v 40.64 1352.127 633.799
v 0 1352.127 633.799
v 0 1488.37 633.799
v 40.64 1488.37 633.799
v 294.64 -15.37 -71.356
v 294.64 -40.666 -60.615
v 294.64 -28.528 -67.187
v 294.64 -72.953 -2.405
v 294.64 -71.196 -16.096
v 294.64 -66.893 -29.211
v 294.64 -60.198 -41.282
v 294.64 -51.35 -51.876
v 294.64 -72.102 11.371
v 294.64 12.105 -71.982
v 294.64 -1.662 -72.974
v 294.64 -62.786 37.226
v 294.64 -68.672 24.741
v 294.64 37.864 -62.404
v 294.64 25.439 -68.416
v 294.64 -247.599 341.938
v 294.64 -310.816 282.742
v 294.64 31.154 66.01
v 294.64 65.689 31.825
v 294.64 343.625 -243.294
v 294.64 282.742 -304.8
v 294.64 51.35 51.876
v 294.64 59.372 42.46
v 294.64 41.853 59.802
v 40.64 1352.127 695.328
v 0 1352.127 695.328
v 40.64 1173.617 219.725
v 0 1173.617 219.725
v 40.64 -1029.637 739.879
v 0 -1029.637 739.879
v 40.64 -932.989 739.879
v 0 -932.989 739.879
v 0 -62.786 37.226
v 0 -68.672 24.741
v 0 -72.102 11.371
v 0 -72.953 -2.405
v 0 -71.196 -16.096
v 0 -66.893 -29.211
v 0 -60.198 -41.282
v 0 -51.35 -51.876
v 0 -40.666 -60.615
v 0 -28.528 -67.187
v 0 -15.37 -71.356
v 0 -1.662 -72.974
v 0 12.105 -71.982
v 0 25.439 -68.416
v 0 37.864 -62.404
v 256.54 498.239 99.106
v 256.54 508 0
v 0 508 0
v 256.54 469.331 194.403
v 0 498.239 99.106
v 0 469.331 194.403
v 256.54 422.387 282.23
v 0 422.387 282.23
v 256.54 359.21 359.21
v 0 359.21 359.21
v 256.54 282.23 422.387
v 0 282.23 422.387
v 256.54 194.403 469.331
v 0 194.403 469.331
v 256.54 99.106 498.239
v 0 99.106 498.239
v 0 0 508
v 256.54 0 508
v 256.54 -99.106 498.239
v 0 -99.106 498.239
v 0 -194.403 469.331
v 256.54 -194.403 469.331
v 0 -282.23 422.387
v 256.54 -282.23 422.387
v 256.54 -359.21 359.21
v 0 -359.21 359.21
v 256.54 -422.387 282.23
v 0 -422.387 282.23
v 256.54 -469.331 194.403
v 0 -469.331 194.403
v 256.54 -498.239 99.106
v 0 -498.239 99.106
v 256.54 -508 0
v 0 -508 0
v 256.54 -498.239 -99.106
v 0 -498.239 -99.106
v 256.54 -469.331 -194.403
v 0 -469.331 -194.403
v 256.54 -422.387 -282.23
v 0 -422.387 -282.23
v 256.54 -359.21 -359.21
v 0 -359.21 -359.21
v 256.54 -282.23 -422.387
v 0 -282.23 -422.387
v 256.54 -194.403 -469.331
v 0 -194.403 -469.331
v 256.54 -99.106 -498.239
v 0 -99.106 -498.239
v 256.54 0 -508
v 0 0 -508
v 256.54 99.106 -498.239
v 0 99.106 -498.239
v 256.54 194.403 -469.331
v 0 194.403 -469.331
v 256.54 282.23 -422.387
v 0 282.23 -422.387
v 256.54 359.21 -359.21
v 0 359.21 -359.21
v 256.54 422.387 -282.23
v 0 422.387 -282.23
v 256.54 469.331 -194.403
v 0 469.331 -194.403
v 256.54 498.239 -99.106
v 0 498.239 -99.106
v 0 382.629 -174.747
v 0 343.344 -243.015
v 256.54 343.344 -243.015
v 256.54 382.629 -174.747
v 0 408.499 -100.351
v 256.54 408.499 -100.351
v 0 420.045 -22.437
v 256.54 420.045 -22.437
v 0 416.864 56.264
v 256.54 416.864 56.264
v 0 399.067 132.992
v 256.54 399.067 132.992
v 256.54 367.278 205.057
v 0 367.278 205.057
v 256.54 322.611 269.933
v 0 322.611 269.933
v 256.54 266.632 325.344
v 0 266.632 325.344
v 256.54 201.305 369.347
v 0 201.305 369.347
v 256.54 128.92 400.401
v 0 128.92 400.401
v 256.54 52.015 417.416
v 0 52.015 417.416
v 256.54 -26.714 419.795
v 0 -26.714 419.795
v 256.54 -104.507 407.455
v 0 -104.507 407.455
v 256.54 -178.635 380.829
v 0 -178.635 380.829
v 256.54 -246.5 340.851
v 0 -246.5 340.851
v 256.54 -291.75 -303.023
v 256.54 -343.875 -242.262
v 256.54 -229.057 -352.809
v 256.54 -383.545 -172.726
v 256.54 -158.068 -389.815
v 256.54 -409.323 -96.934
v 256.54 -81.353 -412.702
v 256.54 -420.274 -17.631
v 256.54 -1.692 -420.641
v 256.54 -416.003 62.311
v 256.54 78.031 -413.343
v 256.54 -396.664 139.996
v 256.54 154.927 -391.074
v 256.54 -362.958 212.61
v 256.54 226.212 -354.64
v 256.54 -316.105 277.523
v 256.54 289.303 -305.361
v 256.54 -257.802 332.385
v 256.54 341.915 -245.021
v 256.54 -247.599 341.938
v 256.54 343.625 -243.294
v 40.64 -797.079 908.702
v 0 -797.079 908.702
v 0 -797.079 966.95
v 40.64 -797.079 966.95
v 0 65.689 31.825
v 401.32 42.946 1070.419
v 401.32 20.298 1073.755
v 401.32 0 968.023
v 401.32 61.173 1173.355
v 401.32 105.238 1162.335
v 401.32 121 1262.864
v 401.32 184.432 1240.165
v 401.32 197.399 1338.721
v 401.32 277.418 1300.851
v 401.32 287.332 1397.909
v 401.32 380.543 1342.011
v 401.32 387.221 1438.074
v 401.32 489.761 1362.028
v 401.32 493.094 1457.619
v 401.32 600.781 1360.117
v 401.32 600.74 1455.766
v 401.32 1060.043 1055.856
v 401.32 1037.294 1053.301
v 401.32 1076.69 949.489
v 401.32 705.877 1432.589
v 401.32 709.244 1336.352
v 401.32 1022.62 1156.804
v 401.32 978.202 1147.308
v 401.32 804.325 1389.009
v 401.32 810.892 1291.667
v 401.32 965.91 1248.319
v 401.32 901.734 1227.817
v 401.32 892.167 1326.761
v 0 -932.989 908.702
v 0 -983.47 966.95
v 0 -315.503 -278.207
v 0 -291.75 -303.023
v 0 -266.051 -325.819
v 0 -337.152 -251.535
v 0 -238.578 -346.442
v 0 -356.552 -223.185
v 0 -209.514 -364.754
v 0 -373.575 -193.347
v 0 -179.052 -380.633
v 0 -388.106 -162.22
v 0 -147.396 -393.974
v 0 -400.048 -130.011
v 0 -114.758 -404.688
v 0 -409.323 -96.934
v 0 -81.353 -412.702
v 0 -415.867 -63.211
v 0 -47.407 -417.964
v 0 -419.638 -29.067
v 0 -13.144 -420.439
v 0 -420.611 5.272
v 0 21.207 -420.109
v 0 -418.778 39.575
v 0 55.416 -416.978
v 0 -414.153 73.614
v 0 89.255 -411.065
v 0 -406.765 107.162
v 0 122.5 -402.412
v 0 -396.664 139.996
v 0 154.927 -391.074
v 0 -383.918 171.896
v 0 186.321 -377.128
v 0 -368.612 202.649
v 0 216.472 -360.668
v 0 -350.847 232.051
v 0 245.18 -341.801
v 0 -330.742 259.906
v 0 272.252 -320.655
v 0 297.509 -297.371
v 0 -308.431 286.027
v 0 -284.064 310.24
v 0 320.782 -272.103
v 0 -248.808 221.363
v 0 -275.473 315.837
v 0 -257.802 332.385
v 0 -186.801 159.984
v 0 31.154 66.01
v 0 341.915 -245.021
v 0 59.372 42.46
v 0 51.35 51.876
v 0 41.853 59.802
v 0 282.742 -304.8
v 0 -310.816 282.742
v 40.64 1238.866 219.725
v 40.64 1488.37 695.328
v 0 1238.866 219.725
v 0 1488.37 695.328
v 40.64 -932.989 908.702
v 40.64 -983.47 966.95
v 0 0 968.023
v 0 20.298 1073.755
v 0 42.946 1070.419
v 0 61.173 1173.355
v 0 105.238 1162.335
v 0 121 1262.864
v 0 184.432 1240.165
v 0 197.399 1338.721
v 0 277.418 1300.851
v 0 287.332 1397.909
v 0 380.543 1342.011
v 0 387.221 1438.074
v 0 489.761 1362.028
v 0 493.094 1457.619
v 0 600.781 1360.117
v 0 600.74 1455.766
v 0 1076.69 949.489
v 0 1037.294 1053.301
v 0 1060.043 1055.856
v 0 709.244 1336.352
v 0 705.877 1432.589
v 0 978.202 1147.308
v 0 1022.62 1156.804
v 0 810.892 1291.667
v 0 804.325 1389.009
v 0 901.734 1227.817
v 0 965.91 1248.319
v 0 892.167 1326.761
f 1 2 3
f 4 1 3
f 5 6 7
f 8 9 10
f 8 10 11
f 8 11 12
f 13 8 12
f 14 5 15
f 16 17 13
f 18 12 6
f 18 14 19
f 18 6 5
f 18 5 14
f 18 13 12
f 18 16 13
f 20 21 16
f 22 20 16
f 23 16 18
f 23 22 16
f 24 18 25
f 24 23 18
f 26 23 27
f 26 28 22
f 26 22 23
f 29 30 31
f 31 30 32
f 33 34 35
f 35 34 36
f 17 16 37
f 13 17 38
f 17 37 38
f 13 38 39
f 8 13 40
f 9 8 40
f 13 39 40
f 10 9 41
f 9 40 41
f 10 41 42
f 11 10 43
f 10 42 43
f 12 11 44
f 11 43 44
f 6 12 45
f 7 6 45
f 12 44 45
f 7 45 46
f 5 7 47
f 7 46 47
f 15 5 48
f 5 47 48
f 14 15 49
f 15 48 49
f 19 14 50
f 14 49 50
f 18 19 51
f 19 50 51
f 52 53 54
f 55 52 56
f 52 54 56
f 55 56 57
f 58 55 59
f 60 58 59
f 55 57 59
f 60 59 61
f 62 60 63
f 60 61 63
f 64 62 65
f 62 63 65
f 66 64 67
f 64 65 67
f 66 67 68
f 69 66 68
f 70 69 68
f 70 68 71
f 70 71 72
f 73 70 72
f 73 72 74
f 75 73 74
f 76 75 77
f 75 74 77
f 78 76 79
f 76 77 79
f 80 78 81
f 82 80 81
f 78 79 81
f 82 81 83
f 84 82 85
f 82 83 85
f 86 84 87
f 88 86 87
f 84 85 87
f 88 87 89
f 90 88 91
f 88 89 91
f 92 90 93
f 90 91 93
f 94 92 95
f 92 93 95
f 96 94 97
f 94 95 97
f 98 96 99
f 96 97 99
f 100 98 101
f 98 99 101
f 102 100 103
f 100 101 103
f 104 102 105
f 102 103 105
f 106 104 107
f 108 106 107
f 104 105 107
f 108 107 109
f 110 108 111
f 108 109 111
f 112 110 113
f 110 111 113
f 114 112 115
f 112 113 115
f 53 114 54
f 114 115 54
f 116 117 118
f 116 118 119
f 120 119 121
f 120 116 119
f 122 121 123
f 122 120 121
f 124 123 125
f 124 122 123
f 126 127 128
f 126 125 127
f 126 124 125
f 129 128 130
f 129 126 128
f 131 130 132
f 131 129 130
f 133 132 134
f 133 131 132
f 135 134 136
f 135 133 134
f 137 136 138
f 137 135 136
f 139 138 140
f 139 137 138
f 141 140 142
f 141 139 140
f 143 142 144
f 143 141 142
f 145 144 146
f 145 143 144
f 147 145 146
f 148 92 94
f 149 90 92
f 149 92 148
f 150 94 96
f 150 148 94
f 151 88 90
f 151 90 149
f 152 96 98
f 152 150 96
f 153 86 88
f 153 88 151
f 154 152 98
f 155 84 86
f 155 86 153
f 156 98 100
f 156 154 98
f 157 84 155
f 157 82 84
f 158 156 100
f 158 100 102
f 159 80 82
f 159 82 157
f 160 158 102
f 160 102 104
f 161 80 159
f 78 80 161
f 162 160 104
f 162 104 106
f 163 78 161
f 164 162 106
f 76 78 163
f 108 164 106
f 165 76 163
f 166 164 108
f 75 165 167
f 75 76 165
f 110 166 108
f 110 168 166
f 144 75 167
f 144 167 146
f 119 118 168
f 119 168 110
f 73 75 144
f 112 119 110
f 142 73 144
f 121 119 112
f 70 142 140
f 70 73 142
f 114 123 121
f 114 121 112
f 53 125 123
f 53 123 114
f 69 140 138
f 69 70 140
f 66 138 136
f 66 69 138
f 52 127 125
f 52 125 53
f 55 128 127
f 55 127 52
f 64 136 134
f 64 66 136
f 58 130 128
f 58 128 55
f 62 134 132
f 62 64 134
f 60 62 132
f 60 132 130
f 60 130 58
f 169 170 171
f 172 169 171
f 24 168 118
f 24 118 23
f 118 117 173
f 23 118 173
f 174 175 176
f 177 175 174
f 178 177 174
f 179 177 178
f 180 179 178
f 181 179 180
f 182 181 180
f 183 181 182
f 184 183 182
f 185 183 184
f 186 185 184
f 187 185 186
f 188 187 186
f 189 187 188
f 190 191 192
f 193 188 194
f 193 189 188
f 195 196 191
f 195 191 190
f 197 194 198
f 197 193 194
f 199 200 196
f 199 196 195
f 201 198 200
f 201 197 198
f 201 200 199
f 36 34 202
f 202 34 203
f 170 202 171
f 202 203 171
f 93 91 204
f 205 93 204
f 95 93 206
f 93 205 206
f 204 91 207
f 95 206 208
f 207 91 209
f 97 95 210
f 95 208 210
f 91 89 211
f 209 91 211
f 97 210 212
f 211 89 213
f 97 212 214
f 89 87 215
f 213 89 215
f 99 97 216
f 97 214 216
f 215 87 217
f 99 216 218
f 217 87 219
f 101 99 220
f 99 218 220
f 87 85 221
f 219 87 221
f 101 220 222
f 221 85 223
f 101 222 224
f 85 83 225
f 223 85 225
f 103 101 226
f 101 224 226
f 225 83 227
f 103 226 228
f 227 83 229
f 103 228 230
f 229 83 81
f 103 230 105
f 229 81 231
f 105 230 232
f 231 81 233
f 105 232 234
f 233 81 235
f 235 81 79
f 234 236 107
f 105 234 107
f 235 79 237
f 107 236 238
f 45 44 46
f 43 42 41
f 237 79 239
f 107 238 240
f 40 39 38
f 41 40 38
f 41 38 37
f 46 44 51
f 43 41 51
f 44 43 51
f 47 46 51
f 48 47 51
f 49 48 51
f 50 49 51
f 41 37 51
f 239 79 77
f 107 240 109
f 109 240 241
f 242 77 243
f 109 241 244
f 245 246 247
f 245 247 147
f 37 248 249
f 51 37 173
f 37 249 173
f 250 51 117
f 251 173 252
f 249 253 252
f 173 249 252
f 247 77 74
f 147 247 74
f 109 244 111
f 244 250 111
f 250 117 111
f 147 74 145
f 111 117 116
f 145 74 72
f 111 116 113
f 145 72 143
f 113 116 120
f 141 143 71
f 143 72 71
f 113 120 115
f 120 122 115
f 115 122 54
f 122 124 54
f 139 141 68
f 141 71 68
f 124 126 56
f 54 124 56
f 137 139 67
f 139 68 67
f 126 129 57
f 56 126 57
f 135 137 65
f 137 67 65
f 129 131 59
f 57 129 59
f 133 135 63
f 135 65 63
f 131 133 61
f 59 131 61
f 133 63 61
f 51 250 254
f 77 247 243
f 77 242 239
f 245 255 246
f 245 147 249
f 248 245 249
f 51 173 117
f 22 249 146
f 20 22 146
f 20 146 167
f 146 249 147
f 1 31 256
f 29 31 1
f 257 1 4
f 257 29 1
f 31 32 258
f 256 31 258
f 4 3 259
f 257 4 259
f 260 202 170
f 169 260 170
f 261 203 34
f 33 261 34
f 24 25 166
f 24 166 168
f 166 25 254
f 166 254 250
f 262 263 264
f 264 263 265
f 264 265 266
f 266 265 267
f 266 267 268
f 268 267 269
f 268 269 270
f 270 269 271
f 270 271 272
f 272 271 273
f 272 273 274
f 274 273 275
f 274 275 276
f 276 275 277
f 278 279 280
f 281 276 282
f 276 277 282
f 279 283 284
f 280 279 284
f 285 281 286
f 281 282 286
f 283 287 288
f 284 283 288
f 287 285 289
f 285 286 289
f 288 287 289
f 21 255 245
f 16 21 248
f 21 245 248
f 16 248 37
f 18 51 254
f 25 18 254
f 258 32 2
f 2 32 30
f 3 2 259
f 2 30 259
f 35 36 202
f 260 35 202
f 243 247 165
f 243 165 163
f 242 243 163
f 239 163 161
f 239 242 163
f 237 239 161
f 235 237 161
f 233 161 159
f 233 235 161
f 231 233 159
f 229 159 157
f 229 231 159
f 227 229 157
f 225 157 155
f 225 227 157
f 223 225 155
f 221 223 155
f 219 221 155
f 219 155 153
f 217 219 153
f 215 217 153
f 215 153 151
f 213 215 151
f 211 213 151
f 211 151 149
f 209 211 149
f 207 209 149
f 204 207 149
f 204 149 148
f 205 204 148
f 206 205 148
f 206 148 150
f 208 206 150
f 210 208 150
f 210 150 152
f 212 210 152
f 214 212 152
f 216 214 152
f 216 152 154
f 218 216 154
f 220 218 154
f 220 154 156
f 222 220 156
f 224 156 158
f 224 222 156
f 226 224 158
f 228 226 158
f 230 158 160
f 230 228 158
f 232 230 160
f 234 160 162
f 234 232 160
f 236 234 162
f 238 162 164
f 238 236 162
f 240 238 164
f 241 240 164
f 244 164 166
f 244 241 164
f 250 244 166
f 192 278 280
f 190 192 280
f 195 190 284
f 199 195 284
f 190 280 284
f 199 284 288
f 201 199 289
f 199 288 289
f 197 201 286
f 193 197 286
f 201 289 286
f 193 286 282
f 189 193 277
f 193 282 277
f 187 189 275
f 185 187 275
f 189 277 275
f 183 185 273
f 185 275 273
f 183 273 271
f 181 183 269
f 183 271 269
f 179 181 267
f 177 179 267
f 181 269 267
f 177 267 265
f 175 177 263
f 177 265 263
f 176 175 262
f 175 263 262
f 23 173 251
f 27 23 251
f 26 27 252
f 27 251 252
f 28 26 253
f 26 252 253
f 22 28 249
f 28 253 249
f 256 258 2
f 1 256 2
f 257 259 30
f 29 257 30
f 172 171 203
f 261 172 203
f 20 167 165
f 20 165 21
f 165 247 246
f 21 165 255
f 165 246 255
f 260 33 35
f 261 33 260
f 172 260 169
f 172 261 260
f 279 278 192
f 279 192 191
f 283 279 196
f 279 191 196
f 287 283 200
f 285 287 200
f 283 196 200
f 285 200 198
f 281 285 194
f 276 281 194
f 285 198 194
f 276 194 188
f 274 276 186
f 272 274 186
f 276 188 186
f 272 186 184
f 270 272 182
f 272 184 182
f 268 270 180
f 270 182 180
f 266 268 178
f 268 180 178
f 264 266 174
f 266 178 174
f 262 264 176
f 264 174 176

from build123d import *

# Parameters (mm, degrees)
F0_R      = 508
F0_R_2    = 420.6439468704
F1_DEPTH  = 256.54
F3_DEPTH  = 294.64
F5_DEPTH  = 401.32
F7_DEPTH  = 815.34
F9_DEPTH  = 40.64
F10_DEPTH = 38.1
F12_DEPTH = 40.64


with BuildPart() as f1:
    # F0 (on Right) → F1 (new body)
    with BuildSketch(Plane.YZ):
        Circle(F0_R)
        Circle(F0_R_2, mode=Mode.SUBTRACT)
    extrude(amount=F1_DEPTH)

    # F2 (on Right) → F3 (join)
    with BuildSketch(Plane.YZ):
        with BuildLine():
            ThreePointArc((37.8640968703, -62.4038721518), (63.6071358166, -35.8059403527), (72.9926920406, 0))
            ThreePointArc((72.9926920406, 0), (71.1434260152, 16.3262373548), (65.6893300543, 31.8252259749))
            Line((65.6893300543, 31.8252259749), (31.1544355507, 66.0101070811))
            ThreePointArc((31.1544355507, 66.0101070811), (-21.3838451619, 69.7901444147), (-62.7863341252, 37.2264601924))
            Line((-62.7863341252, 37.2264601924), (37.8640968703, -62.4038721518))
        make_face()
        with BuildLine():
            ThreePointArc((65.6893300543, 31.8252259749), (71.1434260152, 16.3262373548), (72.9926920406, 0))
            ThreePointArc((72.9926920406, 0), (63.6071358166, -35.8059403527), (37.8640968703, -62.4038721518))
            Line((37.8640968703, -62.4038721518), (282.742112875, -304.8000335693))
            Line((282.742112875, -304.8000335693), (343.6251143049, -243.2936610617))
            Line((343.6251143049, -243.2936610617), (65.6893300543, 31.8252259749))
        make_face()
        with BuildLine():
            Line((31.1544355507, 66.0101070811), (65.6893300543, 31.8252259749))
            ThreePointArc((65.6893300543, 31.8252259749), (51.3500755423, 51.8758405536), (31.1544355507, 66.0101070811))
        make_face()
        with BuildLine():
            ThreePointArc((-62.7863341252, 37.2264601924), (-51.3500755423, -51.8758405536), (37.8640968703, -62.4038721518))
            Line((37.8640968703, -62.4038721518), (-62.7863341252, 37.2264601924))
        make_face()
        with BuildLine():
            ThreePointArc((-62.7863341252, 37.2264601924), (-21.3838451619, 69.7901444147), (31.1544355507, 66.0101070811))
            Line((31.1544355507, 66.0101070811), (-247.5991393836, 341.9384964397))
            Line((-247.5991393836, 341.9384964397), (-310.8157813549, 282.742112875))
            Line((-310.8157813549, 282.742112875), (-62.7863341252, 37.2264601924))
        make_face()
    extrude(amount=F3_DEPTH)


with BuildPart() as f5:
    # F4 (on Right) → F5 (new body)
    with BuildSketch(Plane.YZ):
        with BuildLine():
            Line((0, 968.0234789848), (1076.6899585724, 949.4888782501))
            ThreePointArc((1076.6899585724, 949.4888782501), (546.9629750359, 1459.3825271205), (0, 968.0234789848))
        make_face()
    extrude(amount=F5_DEPTH)

    # F6 (on face) → F7 (cut)
    with BuildSketch(Plane.YZ.offset(401.32)):
        with BuildLine():
            Line((0, 968.0234789848), (1076.6899585724, 949.4888782501))
            ThreePointArc((1076.6899585724, 949.4888782501), (545.3180750446, 1363.8289552401), (0, 968.0234789848))
        make_face()
    extrude(amount=-F7_DEPTH, mode=Mode.SUBTRACT)


with BuildPart() as f9:
    # F8 (on Right) → F9 (new body)
    with BuildSketch(Plane.YZ):
        Polygon((1488.3697451586, 695.3280602446), (1352.127020076, 695.3280602446), (1173.6171278574, 219.7250552287), (1238.8656338662, 219.7250552287), (1352.127020076, 633.799109388), (1488.3697451586, 633.799109388), align=None)
    extrude(amount=F9_DEPTH)

    # F8 (on Right) → F10 (join)
    with BuildSketch(Plane.YZ):
        Polygon((1488.3697451586, 695.3280602446), (1352.127020076, 695.3280602446), (1173.6171278574, 219.7250552287), (1238.8656338662, 219.7250552287), (1352.127020076, 633.799109388), (1488.3697451586, 633.799109388), align=None)
    extrude(amount=F10_DEPTH)


with BuildPart() as f12:
    # F11 (on Right) → F12 (new body)
    with BuildSketch(Plane.YZ):
        Polygon((-797.0792651176, 966.9497013092), (-863.0927801132, 966.9497013092), (-983.4704399109, 966.9497013092), (-1029.6372175217, 739.879488945), (-932.9894781113, 739.879488945), (-932.9894781113, 908.7024331093), (-797.0792651176, 908.7024331093), align=None)
    extrude(amount=F12_DEPTH)


solid = Compound([f1.part, f5.part, f9.part, f12.part])
